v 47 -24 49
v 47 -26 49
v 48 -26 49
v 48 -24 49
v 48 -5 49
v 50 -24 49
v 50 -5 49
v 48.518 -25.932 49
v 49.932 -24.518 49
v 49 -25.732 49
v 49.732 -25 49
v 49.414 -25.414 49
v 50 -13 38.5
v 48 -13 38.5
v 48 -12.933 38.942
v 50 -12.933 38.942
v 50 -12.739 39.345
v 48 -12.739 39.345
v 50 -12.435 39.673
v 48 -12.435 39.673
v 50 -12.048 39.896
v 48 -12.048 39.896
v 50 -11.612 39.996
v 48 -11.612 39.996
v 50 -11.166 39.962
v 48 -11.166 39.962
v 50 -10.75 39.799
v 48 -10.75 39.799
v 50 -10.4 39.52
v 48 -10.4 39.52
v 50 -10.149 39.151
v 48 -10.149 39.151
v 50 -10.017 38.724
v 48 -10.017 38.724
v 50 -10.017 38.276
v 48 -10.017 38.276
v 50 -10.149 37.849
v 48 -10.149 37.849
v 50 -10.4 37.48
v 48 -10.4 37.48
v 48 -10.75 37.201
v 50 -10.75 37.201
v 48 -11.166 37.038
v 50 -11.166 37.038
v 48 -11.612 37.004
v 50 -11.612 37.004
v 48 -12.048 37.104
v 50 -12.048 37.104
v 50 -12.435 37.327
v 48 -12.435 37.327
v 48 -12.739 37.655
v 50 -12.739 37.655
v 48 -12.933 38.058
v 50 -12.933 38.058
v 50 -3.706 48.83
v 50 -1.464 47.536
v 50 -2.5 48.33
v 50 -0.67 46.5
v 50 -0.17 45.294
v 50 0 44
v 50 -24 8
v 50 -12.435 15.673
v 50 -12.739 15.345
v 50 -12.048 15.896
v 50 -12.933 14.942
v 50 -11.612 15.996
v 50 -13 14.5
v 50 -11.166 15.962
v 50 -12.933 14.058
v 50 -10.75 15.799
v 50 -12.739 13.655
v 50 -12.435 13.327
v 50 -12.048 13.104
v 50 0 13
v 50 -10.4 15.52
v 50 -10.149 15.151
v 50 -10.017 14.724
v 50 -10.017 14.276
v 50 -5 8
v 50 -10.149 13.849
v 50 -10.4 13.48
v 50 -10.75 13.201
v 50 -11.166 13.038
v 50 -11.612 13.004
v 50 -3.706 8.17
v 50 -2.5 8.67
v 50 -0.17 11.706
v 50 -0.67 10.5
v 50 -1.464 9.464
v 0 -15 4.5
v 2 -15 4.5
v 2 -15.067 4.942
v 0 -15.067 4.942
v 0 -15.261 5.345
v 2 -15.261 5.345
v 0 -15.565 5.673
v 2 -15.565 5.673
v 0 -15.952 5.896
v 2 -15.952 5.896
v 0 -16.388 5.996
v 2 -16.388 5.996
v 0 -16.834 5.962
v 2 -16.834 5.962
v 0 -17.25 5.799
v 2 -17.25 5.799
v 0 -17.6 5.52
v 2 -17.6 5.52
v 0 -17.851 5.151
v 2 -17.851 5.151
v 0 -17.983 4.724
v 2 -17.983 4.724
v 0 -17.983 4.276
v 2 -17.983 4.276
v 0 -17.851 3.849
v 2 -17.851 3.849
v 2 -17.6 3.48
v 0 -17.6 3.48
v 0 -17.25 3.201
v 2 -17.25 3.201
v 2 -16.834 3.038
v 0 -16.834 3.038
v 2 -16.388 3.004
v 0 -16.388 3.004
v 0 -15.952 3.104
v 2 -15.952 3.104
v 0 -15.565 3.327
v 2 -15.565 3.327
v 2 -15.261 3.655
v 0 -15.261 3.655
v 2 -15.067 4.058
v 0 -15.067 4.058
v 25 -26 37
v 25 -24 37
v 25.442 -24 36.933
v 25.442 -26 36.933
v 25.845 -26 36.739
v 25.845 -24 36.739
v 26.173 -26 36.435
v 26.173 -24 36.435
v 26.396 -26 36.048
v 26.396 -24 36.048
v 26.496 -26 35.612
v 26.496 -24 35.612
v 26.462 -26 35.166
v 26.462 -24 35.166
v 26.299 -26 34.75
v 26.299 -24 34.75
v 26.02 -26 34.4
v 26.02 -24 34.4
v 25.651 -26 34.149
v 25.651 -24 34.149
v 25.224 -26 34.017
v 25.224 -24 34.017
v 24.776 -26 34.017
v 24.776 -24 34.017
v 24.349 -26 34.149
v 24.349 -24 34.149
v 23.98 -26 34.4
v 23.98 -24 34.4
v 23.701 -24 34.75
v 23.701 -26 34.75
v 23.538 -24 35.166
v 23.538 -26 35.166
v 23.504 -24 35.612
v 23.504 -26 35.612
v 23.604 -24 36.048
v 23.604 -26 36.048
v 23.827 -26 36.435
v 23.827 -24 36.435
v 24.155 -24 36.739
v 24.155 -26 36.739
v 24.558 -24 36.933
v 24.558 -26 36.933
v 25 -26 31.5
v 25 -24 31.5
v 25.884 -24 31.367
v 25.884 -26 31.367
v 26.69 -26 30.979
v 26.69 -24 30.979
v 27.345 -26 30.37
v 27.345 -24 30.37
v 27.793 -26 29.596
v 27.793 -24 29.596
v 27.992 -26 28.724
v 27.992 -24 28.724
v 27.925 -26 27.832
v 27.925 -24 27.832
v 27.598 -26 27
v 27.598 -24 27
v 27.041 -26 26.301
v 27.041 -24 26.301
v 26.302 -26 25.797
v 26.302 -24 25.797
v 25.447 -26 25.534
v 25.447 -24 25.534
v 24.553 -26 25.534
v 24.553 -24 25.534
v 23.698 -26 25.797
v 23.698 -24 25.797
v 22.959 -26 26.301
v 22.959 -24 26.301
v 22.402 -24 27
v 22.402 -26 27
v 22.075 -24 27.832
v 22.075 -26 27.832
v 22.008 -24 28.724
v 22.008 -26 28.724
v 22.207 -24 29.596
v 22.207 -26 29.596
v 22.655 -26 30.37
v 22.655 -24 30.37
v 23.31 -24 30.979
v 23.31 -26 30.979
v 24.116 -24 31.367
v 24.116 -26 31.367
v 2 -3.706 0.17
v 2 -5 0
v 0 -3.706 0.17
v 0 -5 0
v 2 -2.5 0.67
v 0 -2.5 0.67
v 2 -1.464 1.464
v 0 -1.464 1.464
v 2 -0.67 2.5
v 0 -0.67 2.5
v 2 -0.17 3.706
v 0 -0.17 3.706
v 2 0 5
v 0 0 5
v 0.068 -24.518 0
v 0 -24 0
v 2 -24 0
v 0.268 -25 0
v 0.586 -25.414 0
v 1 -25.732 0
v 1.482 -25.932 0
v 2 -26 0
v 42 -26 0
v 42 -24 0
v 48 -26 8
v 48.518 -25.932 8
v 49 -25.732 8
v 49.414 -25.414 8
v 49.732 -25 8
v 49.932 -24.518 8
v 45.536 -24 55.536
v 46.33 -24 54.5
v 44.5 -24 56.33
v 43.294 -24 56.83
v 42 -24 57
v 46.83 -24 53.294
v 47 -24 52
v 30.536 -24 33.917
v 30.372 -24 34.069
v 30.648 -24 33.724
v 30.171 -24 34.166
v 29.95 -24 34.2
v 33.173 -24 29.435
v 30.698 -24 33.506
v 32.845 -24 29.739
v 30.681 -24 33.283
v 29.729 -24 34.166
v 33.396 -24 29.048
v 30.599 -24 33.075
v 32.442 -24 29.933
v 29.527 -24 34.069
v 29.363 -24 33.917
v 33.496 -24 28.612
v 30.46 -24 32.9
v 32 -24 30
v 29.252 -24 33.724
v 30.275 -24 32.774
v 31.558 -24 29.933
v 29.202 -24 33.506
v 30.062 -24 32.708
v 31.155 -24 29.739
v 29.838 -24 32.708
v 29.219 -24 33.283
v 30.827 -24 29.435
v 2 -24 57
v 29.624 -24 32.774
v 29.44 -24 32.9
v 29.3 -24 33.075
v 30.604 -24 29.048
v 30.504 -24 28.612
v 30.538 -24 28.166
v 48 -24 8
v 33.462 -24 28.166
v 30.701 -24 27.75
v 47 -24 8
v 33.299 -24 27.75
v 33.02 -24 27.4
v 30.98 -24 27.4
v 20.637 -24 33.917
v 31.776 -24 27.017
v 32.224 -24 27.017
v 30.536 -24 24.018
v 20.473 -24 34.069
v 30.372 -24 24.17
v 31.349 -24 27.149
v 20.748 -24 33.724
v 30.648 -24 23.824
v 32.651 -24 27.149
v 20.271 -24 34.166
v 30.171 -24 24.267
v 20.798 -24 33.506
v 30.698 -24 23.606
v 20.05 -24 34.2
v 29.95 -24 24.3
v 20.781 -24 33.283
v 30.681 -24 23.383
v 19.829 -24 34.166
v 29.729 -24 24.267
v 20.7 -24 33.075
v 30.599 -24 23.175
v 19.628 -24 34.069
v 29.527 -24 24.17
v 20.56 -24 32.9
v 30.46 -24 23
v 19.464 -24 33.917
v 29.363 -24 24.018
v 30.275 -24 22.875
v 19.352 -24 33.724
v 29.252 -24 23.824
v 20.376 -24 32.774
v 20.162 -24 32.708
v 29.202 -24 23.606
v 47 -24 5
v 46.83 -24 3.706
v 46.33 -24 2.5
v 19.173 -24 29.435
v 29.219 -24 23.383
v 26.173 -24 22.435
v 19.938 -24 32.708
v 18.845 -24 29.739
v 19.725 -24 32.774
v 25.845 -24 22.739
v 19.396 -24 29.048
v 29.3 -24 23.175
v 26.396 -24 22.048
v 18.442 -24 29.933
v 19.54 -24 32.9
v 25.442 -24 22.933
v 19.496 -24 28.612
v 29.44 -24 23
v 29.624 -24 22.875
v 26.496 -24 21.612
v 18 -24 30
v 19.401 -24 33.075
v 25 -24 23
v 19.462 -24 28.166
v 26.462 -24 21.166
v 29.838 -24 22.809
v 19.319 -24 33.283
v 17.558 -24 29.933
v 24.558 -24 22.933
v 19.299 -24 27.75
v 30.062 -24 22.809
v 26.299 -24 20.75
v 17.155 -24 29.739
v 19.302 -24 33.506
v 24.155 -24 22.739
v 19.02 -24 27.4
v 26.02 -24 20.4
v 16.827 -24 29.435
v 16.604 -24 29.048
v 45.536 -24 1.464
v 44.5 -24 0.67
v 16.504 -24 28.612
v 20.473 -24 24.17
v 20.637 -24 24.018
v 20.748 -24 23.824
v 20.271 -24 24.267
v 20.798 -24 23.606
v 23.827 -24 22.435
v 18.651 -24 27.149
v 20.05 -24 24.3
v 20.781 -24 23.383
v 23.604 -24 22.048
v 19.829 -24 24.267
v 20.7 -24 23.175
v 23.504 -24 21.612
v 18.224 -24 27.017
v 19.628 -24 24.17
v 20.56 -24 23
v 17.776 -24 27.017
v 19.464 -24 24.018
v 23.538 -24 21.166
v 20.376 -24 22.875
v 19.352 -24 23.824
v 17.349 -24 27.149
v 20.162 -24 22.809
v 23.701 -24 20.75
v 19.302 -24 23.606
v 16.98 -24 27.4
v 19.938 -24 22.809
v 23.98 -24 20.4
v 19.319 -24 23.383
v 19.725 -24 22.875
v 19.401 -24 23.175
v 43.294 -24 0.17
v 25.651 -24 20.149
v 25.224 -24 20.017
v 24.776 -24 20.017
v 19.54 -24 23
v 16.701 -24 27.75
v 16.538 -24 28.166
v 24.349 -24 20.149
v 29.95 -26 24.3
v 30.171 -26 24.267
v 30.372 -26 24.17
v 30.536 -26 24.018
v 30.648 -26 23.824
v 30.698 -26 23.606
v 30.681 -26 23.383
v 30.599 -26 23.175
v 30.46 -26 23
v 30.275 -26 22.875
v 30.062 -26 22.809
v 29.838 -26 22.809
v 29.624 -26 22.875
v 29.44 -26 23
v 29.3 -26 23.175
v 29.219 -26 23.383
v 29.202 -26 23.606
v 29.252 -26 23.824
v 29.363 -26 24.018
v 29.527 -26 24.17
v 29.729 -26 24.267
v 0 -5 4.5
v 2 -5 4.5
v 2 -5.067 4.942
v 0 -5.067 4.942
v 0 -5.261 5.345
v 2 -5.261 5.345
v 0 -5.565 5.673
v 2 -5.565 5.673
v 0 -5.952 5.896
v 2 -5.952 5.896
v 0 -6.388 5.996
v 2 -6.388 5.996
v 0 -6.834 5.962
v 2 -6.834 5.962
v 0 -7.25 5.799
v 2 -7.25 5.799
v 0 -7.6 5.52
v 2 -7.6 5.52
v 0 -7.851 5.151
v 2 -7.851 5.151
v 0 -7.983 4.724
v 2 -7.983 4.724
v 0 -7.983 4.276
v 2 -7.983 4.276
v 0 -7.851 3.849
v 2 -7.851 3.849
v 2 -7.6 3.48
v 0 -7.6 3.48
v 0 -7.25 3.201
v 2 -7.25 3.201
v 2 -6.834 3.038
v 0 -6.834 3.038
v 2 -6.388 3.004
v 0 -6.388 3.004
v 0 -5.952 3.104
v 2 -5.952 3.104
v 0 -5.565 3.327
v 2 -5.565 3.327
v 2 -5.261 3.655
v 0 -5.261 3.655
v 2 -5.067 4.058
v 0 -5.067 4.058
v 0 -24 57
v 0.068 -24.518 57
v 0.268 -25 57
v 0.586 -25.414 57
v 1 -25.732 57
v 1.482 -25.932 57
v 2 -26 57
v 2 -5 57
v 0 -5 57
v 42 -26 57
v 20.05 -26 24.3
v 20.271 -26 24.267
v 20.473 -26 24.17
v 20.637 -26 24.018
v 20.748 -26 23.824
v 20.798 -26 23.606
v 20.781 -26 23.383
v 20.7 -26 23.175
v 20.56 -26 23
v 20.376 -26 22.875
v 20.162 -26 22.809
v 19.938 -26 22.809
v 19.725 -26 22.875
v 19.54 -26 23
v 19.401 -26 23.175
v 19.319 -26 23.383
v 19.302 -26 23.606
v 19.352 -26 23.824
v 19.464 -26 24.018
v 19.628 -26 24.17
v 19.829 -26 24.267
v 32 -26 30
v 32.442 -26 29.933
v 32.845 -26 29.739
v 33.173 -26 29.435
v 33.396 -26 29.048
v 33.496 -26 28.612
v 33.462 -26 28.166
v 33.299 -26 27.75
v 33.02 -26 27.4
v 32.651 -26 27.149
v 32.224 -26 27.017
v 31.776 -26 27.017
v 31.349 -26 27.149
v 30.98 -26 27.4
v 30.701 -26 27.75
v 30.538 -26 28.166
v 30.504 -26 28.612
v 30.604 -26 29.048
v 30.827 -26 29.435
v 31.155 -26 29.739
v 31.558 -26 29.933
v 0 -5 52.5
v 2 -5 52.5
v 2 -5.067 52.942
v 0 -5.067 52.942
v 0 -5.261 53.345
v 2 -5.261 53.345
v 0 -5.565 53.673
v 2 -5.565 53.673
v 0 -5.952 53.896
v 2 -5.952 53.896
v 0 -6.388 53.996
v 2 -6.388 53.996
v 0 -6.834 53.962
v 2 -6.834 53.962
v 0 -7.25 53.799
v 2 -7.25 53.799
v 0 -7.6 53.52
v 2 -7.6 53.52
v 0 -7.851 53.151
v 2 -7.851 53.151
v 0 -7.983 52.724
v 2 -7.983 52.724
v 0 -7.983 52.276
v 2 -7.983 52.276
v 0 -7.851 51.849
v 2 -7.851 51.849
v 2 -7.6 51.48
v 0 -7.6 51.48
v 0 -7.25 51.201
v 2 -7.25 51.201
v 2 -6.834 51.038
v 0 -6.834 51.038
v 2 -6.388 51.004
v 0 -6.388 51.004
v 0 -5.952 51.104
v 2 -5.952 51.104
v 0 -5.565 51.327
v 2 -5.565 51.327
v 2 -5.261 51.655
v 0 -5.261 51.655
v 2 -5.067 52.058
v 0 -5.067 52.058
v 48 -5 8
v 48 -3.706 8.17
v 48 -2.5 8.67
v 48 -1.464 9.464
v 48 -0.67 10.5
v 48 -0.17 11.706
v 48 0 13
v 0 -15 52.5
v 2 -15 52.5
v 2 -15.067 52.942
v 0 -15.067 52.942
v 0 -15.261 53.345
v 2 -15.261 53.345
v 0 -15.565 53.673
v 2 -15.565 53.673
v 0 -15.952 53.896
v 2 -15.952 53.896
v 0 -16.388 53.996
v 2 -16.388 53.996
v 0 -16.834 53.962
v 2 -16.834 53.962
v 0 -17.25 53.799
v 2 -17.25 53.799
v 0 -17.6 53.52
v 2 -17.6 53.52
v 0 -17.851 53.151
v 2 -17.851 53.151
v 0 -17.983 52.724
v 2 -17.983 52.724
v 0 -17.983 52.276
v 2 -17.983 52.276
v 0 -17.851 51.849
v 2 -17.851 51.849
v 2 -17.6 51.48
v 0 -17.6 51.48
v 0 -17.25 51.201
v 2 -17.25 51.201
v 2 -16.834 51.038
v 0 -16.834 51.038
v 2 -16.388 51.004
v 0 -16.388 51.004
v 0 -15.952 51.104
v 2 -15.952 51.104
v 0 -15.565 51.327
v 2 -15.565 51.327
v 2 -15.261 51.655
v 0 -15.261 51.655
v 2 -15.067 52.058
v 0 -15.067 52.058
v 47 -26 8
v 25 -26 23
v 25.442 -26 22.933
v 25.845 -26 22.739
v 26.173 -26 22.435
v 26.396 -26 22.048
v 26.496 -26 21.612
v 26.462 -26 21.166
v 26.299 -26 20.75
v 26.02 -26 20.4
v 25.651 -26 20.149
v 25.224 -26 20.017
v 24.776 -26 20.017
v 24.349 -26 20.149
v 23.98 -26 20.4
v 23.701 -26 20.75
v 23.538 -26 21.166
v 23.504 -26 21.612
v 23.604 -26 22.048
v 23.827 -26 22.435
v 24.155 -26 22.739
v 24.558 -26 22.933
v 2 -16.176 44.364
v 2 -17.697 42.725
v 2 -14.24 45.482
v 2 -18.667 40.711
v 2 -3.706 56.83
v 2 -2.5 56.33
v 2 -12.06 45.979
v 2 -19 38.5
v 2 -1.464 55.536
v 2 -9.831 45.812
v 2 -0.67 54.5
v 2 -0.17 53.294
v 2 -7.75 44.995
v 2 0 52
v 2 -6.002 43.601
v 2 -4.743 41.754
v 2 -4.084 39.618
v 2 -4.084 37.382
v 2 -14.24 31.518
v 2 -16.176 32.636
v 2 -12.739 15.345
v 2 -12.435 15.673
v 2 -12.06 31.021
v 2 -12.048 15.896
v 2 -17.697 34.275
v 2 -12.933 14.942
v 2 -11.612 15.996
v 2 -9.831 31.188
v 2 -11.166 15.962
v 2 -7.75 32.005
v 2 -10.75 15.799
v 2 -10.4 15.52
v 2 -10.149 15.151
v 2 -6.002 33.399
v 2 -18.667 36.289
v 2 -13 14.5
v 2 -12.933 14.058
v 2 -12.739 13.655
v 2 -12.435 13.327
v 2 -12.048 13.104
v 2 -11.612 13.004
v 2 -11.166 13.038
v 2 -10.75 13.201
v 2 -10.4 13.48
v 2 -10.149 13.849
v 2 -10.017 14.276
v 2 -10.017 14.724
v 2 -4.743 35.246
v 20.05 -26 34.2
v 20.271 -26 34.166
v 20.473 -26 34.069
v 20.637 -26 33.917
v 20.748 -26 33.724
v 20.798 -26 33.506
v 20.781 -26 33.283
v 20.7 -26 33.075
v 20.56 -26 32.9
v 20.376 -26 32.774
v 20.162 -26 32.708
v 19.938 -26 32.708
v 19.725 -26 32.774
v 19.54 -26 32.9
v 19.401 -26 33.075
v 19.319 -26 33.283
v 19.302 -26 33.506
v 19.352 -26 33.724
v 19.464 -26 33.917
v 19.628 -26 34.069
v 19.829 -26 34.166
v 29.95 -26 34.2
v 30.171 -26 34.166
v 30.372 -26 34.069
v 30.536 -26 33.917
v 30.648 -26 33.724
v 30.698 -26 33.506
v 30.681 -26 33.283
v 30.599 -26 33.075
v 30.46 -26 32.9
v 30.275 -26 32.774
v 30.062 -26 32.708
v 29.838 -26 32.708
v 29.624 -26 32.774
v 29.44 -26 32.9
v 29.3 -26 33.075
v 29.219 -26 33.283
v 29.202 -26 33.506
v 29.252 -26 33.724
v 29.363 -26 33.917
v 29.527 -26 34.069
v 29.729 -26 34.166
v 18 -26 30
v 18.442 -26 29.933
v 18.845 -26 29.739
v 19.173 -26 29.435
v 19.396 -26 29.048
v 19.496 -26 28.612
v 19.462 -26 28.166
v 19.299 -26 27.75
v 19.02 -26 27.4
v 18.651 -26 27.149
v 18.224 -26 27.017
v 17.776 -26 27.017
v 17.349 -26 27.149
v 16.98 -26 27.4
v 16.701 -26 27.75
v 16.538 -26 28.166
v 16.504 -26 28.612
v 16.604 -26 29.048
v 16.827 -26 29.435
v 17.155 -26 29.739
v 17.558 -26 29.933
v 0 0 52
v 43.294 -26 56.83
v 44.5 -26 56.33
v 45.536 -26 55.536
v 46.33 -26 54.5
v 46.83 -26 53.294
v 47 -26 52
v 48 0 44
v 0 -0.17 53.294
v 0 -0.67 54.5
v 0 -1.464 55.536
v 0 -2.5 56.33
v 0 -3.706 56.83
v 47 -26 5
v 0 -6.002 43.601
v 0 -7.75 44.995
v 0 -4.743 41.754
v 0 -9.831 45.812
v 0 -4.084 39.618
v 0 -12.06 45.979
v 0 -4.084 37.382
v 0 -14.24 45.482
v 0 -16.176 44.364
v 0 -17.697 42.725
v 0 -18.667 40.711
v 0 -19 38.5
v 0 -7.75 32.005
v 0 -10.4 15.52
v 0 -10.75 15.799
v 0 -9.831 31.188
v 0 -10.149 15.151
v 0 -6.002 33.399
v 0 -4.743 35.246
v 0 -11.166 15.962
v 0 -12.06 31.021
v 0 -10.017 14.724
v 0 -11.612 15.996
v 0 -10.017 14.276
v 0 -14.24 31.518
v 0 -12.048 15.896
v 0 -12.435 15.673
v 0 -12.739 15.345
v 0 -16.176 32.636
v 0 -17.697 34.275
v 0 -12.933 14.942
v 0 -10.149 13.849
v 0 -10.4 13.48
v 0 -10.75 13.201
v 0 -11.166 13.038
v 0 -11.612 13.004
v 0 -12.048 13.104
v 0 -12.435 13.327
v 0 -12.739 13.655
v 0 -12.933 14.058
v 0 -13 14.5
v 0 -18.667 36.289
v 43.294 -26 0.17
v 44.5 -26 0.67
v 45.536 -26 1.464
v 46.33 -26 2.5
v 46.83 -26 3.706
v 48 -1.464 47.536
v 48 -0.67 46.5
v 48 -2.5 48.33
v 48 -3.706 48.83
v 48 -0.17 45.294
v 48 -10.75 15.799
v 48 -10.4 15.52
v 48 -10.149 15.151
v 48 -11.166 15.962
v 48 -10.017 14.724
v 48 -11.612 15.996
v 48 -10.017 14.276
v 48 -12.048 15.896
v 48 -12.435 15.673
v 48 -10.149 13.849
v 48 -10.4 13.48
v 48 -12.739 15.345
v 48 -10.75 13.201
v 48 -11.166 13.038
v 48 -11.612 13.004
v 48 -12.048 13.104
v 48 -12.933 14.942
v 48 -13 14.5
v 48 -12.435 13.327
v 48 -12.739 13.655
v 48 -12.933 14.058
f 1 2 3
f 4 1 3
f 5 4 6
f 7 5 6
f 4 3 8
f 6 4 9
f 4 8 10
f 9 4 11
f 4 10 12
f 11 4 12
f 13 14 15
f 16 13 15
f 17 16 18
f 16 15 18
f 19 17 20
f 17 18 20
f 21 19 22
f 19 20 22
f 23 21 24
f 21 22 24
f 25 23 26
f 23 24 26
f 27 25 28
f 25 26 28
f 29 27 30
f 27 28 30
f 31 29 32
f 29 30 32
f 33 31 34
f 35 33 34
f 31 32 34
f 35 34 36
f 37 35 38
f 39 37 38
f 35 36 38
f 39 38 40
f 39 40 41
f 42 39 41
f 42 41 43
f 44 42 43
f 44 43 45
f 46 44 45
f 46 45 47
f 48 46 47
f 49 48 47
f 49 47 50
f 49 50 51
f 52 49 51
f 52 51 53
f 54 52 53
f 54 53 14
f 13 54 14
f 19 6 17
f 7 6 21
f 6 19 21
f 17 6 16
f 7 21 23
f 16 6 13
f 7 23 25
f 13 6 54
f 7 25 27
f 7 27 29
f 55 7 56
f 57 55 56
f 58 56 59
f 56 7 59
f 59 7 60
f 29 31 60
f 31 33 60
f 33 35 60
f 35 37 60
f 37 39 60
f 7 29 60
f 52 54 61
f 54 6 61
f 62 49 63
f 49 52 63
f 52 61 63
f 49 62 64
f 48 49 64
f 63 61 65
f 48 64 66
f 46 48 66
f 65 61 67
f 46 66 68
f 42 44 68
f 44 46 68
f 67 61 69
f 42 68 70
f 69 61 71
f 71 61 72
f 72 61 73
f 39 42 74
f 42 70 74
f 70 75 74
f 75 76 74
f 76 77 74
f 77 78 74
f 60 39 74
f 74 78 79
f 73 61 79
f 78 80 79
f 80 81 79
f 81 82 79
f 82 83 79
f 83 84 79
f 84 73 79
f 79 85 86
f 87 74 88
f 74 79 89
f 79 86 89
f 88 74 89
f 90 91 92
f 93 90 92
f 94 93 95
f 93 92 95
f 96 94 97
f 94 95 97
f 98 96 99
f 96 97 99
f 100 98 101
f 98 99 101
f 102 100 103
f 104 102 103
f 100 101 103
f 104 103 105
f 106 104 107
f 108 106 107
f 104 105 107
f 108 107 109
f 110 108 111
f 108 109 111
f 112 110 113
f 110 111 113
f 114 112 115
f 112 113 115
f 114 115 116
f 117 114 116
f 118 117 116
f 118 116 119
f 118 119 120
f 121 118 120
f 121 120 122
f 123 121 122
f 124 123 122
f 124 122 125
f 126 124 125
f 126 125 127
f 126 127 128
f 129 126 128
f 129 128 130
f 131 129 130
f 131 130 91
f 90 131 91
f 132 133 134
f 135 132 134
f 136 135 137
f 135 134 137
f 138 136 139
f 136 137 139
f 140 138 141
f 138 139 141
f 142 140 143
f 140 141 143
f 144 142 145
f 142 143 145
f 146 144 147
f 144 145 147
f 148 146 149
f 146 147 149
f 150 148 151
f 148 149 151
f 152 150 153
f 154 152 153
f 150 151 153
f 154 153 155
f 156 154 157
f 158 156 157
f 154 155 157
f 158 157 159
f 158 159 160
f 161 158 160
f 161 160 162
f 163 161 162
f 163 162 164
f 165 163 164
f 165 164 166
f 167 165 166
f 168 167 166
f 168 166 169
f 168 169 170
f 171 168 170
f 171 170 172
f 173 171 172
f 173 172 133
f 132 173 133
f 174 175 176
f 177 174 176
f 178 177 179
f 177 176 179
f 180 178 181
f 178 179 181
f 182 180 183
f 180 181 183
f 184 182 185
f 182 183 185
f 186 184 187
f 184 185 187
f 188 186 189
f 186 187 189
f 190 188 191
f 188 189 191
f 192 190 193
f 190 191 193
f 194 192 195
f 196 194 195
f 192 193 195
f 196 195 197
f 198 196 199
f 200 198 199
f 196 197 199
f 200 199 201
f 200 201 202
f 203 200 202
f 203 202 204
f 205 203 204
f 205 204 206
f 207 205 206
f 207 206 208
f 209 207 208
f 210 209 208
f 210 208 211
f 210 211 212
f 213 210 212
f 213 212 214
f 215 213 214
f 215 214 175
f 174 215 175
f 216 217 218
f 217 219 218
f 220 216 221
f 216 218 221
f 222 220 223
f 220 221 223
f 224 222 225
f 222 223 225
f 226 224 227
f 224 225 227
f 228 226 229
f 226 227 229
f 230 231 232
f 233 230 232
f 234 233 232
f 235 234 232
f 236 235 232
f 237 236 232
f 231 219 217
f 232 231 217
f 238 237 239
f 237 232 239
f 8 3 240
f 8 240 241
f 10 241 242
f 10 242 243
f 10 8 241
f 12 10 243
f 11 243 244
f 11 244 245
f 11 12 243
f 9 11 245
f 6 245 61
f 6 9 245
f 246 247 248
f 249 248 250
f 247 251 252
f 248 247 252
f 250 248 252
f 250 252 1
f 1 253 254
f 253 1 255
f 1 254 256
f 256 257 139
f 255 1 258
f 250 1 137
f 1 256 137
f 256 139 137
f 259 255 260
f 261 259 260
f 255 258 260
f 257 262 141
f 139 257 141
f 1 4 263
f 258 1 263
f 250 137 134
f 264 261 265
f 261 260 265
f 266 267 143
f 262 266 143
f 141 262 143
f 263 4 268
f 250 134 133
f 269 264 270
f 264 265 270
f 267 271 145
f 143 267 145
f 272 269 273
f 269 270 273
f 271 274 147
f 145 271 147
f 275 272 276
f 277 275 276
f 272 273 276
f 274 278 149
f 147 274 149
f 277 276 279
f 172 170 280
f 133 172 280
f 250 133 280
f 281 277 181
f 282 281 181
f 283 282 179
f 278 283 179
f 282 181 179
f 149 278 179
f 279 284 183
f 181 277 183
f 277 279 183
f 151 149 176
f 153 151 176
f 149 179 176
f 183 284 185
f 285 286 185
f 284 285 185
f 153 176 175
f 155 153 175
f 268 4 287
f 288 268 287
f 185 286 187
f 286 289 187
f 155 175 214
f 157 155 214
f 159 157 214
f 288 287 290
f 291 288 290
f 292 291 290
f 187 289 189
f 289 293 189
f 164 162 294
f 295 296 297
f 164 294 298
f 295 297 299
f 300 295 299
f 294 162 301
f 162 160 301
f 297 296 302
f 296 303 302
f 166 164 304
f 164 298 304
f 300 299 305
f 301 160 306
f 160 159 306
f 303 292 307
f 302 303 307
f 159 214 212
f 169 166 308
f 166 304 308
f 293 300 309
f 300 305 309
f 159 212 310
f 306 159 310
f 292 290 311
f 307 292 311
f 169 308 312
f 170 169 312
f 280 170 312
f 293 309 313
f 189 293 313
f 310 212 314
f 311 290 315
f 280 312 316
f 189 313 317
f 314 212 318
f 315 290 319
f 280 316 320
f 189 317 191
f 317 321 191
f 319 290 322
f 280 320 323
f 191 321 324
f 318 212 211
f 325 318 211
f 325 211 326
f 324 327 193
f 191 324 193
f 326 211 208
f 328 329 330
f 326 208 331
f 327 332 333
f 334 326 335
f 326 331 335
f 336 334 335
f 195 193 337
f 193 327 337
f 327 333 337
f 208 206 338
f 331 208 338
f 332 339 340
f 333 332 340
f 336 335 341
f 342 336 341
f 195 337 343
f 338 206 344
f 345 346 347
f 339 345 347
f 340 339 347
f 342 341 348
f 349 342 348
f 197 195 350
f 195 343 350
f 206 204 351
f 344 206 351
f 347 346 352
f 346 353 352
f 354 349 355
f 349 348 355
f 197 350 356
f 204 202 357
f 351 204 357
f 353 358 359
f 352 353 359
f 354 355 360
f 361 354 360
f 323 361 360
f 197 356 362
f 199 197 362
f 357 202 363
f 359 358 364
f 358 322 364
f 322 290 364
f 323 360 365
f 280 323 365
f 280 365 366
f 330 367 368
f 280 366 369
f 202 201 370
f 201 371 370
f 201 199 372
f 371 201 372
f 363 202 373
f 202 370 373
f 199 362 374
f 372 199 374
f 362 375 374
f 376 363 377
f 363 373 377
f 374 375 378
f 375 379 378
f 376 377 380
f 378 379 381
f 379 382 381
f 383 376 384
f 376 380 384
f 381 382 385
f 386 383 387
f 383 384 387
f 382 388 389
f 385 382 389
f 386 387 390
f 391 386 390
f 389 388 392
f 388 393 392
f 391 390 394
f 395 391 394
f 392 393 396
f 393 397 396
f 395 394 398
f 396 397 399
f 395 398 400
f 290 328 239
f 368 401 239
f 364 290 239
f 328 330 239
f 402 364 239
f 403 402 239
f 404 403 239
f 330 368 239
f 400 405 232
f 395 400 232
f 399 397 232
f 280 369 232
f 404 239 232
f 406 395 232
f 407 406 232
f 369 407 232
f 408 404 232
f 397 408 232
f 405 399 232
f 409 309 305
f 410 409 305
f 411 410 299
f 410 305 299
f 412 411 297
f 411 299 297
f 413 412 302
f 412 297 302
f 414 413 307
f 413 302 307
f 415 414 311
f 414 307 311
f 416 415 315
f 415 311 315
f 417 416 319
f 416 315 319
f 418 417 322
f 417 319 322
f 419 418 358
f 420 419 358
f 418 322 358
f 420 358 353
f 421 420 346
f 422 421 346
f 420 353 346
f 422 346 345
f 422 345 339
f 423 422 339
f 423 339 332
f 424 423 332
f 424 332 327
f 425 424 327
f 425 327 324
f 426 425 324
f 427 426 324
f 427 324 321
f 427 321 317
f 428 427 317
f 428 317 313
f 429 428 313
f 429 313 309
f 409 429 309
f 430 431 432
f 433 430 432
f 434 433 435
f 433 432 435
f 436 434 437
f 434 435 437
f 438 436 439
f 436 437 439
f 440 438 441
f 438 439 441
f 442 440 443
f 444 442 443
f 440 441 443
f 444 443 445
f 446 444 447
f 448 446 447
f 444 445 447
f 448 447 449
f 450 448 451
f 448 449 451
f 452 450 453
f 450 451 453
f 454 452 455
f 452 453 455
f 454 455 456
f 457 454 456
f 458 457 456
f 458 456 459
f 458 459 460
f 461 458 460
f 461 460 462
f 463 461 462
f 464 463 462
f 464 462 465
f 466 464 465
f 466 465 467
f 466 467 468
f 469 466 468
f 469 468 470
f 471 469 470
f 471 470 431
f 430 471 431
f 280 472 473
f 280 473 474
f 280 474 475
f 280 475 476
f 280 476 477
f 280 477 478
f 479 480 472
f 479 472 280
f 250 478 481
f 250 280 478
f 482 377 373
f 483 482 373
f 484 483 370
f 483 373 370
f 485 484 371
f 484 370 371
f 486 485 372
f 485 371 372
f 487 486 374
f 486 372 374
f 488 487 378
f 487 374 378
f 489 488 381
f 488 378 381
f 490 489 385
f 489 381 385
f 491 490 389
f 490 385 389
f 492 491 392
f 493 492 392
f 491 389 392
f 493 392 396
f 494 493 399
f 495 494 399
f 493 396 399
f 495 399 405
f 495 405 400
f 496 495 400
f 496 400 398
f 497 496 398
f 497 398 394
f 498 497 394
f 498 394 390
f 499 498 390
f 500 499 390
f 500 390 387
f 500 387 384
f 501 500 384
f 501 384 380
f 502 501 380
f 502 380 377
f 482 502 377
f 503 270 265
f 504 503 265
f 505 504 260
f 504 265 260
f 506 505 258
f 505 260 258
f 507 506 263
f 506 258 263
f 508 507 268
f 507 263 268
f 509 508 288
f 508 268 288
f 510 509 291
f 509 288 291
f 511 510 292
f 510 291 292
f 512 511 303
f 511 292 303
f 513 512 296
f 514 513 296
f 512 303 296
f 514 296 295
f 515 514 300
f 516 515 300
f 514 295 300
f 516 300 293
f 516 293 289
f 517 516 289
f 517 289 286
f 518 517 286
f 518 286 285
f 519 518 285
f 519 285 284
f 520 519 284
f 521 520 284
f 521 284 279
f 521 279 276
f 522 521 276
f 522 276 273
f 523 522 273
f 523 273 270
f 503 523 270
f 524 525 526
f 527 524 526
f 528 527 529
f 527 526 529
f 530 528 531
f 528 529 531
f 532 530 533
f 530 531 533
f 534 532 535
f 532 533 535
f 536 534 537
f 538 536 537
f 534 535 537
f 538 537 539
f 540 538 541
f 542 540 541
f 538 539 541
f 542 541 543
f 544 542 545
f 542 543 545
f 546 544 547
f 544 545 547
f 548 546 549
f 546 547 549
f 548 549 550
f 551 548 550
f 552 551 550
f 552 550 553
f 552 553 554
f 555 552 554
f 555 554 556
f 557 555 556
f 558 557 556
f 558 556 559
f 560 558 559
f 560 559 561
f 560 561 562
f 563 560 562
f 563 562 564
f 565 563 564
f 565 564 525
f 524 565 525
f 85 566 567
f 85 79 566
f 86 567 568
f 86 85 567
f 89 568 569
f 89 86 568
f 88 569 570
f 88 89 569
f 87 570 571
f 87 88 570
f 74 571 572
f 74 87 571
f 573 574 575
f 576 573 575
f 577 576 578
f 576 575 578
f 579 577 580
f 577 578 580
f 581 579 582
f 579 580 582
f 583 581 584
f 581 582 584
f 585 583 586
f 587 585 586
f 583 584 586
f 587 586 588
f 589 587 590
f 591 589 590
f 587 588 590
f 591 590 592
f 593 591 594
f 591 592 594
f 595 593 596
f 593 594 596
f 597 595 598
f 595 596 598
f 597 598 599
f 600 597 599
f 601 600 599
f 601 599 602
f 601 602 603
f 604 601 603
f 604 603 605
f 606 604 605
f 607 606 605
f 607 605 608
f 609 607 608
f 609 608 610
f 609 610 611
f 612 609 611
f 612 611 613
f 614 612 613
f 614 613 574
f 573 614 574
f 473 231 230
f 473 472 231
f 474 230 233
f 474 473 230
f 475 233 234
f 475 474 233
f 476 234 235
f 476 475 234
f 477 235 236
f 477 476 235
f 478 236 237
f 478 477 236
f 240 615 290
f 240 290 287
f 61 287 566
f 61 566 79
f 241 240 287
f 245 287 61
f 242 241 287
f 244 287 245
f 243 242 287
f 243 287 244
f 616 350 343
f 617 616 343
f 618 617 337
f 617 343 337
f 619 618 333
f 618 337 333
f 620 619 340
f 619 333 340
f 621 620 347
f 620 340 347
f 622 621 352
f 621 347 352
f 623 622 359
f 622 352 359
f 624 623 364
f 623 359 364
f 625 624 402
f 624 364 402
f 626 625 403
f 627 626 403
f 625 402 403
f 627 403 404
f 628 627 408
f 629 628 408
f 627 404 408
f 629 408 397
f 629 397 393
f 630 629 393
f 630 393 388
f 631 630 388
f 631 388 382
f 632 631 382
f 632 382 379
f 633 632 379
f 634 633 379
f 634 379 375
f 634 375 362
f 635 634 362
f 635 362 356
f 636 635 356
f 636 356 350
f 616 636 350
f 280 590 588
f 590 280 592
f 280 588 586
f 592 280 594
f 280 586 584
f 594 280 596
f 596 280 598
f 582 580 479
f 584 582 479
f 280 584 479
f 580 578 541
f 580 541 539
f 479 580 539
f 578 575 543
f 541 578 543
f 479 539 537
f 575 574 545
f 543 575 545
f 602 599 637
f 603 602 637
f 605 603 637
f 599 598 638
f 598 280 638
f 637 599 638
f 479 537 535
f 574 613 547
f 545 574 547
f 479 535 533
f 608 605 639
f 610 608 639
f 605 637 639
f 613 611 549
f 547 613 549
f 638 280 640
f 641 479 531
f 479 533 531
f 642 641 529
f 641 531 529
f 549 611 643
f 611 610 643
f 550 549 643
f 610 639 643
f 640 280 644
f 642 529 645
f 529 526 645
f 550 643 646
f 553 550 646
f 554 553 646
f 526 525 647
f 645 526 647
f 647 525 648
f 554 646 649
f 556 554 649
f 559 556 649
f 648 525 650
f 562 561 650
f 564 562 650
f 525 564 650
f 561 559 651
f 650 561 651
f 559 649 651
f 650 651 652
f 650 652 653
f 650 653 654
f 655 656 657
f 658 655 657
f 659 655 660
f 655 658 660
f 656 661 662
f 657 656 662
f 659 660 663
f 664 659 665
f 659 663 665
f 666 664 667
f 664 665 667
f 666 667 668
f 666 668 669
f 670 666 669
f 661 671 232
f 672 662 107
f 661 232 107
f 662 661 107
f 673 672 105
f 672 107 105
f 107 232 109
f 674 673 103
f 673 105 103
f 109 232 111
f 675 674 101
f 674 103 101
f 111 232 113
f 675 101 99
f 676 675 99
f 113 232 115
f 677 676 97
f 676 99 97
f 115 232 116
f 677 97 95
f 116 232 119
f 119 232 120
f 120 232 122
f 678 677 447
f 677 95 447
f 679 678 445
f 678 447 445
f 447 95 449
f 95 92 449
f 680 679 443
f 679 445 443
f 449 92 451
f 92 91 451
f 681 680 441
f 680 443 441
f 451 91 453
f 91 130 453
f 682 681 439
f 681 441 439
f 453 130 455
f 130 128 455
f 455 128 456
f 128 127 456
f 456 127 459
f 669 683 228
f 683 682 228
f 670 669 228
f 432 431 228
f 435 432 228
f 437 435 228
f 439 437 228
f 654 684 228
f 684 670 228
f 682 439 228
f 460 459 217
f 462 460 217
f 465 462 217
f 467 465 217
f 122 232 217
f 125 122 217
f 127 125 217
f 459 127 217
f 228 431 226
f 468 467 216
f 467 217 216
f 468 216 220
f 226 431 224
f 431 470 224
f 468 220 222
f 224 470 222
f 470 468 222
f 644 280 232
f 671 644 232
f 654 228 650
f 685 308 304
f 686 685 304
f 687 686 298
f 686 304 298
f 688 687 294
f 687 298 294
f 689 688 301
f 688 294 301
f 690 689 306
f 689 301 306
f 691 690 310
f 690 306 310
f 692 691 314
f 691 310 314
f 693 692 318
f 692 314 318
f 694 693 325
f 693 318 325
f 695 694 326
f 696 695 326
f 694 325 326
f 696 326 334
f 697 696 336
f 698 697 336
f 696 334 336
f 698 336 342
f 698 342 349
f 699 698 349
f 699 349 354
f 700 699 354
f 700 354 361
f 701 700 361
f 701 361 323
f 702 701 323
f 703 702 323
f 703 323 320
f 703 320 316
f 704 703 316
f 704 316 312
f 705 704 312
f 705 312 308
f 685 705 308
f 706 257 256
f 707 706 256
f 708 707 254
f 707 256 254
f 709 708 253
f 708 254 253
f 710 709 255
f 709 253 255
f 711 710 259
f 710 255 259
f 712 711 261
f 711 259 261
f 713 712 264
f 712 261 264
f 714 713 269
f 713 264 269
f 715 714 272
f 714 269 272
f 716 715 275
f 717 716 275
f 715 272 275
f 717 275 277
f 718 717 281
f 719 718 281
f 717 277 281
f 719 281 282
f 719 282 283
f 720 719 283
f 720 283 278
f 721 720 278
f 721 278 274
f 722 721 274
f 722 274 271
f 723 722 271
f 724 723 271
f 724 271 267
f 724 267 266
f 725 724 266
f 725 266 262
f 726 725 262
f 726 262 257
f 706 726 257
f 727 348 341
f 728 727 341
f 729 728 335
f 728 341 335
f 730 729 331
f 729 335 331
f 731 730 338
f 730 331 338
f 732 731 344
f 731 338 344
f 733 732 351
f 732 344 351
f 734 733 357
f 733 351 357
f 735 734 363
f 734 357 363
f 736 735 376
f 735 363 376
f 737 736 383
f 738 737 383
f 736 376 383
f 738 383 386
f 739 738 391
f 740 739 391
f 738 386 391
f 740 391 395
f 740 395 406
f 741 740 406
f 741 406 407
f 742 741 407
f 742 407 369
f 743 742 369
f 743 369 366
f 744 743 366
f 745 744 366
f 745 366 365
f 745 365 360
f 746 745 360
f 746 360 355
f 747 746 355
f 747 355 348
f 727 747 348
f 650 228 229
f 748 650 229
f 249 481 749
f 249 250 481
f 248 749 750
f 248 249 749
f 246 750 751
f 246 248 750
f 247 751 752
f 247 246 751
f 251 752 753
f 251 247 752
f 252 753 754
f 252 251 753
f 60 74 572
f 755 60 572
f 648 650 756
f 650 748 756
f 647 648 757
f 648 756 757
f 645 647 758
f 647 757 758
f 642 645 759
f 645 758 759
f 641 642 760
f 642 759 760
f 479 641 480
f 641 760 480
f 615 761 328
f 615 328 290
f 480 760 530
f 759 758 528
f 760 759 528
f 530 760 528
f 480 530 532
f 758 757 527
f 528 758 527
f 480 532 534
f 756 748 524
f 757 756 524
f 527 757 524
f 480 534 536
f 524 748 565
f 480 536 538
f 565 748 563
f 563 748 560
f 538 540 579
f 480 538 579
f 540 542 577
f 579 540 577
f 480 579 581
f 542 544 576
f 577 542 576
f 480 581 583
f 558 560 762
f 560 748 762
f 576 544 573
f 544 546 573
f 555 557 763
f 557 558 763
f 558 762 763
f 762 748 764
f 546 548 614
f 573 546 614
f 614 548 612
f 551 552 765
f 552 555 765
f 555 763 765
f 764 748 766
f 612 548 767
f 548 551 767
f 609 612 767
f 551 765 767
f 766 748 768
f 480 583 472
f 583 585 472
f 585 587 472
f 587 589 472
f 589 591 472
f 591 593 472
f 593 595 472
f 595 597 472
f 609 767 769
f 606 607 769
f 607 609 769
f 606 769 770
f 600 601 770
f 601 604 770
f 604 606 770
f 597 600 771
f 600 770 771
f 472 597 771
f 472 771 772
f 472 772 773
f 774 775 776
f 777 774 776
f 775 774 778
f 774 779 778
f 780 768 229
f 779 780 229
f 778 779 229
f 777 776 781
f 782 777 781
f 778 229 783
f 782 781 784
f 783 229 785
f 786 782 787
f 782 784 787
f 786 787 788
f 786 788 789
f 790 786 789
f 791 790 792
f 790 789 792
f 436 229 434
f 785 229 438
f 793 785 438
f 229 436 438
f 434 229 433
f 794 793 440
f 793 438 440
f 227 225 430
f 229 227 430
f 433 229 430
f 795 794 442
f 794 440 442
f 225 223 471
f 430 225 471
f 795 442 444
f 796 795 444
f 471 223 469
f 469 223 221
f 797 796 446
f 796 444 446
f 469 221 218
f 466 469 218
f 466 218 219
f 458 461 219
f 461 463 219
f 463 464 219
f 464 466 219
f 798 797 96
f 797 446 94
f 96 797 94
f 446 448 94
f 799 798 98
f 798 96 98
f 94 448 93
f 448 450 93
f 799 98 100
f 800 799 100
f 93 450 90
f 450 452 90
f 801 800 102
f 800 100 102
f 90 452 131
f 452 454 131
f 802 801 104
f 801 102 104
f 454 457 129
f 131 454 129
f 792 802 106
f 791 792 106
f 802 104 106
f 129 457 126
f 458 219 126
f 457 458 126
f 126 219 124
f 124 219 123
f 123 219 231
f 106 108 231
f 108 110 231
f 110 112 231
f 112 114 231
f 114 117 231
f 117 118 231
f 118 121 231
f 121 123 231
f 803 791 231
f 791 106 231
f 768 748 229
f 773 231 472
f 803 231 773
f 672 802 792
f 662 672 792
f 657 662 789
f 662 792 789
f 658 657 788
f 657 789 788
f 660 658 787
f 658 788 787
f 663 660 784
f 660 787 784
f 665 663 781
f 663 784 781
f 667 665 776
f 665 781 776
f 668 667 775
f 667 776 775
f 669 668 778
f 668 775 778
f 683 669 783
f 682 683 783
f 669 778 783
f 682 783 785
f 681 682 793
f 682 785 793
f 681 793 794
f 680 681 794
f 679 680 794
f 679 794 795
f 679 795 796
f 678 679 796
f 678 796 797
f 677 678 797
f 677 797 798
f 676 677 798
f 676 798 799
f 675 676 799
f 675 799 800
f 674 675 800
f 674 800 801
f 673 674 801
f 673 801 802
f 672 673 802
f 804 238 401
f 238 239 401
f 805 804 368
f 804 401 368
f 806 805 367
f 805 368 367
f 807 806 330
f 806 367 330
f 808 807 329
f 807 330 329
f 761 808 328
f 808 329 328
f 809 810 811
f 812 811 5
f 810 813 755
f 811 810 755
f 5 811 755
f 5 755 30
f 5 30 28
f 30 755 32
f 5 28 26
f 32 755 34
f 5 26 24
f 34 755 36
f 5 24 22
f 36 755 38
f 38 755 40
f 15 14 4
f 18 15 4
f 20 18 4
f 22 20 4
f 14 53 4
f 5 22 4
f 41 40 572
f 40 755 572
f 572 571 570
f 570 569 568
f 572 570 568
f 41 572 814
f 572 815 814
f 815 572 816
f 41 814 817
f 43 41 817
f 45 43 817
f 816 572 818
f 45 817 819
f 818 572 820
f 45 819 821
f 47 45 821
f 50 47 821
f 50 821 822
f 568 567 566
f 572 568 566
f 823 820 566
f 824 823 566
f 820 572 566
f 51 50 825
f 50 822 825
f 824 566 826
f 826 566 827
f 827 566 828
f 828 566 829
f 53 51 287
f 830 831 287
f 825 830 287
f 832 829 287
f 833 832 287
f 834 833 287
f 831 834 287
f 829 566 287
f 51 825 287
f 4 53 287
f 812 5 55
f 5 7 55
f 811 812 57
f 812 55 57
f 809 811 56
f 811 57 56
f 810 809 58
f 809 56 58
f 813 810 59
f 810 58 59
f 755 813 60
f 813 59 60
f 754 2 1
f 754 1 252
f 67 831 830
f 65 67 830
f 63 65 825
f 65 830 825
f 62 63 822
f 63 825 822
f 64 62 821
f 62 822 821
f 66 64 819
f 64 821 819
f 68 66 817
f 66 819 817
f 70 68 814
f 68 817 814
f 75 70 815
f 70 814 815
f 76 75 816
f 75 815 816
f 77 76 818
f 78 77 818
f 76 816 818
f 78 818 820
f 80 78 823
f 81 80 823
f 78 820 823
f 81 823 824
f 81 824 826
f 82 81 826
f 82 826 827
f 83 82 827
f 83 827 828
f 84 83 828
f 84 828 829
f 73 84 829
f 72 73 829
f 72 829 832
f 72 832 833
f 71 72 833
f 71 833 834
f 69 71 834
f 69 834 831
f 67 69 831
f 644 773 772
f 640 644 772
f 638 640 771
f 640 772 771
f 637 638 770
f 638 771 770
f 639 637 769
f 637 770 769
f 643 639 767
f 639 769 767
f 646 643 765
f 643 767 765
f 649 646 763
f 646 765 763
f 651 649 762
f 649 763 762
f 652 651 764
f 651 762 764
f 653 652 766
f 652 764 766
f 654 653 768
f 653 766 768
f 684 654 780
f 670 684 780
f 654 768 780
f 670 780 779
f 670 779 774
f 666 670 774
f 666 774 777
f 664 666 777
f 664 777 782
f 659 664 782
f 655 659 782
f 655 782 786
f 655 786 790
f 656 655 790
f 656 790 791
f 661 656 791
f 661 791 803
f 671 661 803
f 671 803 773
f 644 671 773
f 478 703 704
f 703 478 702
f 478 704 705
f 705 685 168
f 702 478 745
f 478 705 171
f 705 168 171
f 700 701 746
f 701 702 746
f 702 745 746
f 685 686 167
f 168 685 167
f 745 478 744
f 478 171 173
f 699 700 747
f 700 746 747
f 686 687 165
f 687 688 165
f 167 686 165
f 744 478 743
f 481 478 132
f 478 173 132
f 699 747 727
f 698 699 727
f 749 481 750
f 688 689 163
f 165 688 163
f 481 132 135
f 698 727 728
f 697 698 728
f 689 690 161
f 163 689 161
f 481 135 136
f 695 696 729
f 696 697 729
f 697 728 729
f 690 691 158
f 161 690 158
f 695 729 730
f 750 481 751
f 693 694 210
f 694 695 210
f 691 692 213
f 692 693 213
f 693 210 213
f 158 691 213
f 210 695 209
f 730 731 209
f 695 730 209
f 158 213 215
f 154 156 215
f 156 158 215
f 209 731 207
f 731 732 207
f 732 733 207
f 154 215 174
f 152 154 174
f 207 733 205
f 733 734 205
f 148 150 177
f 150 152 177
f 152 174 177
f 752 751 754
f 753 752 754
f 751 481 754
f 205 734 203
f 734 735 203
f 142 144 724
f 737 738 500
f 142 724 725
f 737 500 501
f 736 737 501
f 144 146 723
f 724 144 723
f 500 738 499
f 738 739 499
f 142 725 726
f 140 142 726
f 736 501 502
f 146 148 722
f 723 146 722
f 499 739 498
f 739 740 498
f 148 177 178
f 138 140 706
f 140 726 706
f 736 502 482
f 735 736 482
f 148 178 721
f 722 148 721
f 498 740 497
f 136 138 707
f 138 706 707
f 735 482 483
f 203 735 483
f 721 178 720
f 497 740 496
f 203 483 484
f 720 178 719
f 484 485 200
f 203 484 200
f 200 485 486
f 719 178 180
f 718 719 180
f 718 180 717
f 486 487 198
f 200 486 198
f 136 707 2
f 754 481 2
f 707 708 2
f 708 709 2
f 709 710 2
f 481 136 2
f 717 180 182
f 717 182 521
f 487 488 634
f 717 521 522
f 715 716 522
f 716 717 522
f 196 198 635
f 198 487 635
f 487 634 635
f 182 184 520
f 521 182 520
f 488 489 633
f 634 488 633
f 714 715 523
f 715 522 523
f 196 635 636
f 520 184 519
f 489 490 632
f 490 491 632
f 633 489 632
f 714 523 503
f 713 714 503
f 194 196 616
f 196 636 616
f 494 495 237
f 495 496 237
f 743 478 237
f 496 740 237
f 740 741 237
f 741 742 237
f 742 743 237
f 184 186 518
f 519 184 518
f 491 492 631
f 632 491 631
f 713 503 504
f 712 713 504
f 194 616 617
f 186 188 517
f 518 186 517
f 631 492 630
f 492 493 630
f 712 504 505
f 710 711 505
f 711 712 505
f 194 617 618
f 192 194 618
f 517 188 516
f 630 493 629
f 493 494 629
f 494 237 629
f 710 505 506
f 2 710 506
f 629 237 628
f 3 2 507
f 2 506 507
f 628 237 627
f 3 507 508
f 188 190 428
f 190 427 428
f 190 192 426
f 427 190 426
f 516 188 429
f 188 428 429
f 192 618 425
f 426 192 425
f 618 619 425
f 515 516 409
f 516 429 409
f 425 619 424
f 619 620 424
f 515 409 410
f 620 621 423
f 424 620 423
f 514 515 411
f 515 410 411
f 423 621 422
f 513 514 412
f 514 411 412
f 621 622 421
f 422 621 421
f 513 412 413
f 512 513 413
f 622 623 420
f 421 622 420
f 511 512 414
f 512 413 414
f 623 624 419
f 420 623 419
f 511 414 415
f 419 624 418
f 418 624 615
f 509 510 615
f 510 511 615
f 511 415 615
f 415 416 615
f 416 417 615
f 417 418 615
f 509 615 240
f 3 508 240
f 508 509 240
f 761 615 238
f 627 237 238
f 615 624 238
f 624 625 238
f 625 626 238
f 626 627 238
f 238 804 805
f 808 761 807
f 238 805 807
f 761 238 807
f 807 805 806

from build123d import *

# Parameters (mm, degrees)
EXTRUDE_1_DEPTH     = 57
SKETCH_2_R          = 7.5
SKETCH_2_R_2        = 1.5
CUT_EXTRUDE_1_DEPTH = 27
SKETCH_3_R          = 1.5
CUT_EXTRUDE_2_DEPTH = 10
SKETCH_4_R          = 1.5
SKETCH_4_R_2        = 3
SKETCH_4_R_3        = 0.75
CUT_EXTRUDE_3_DEPTH = 10
SKETCH_5_R          = 1.5
CUT_EXTRUDE_4_DEPTH = 3
FILLET_2_R          = 2
SKETCH_6_W          = 3
SKETCH_6_H          = 8
CUT_EXTRUDE_5_DEPTH = 44
FILLET_3_R          = 5


with BuildPart() as part:
    # 草图1 → 凸台-拉伸1 (new body)
    with BuildSketch(Plane.XY):
        Polygon((0, 0), (0, -26), (50, -26), (50, 0), (48, 0), (48, -24), (2, -24), (2, 0), align=None)
    extrude(amount=EXTRUDE_1_DEPTH)

    # 草图2 → 切除-拉伸1 (cut)
    with BuildSketch(Plane.ZY):
        with Locations(Location((38.5, -11.5, 0), (0, 0, 270))):
            Circle(SKETCH_2_R)
        with Locations(Location((14.5, -11.5, 0), (0, 0, 270))):
            Circle(SKETCH_2_R_2)
    extrude(amount=-CUT_EXTRUDE_1_DEPTH, mode=Mode.SUBTRACT)

    # 草图3 → 切除-拉伸2 (cut)
    with BuildSketch(Plane(origin=(2, 0, 0), x_dir=(0, 0, -1), z_dir=(1, 0, 0))):
        with Locations(Location((-4.5, -6.5, 0), (0, 0, 90))):
            Circle(SKETCH_3_R)
        with Locations(Location((-4.5, -16.5, 0), (0, 0, 90))):
            Circle(SKETCH_3_R)
        with Locations(Location((-52.5, -16.5, 0), (0, 0, 90))):
            Circle(SKETCH_3_R)
        with Locations(Location((-52.5, -6.5, 0), (0, 0, 90))):
            Circle(SKETCH_3_R)
    extrude(amount=-CUT_EXTRUDE_2_DEPTH, mode=Mode.SUBTRACT)

    # 草图4 → 切除-拉伸3 (cut)
    with BuildSketch(Plane(origin=(0, -24, 0), x_dir=(1, 0, 0), z_dir=(0, 1, 0))):
        with Locations(Location((18, -28.5, 0), (0, 0, 270))):
            Circle(SKETCH_4_R)
        with Locations(Location((25, -21.5, 0), (0, 0, 270))):
            Circle(SKETCH_4_R)
        with Locations(Location((32, -28.5, 0), (0, 0, 270))):
            Circle(SKETCH_4_R)
        with Locations(Location((25, -35.5, 0), (0, 0, 270))):
            Circle(SKETCH_4_R)
        with Locations(Location((25, -28.5, 0), (0, 0, 270))):
            Circle(SKETCH_4_R_2)
        with Locations(Location((20.050252532, -23.550252532, 0), (0, 0, 270))):
            Circle(SKETCH_4_R_3)
        with Locations(Location((29.949747468, -23.550252532, 0), (0, 0, 270))):
            Circle(SKETCH_4_R_3)
        with Locations(Location((29.949747468, -33.449747468, 0), (0, 0, 270))):
            Circle(SKETCH_4_R_3)
        with Locations(Location((20.050252532, -33.449747468, 0), (0, 0, 270))):
            Circle(SKETCH_4_R_3)
    extrude(amount=-CUT_EXTRUDE_3_DEPTH, mode=Mode.SUBTRACT)

    # 草图5 → 切除-拉伸4 (cut)
    with BuildSketch(Plane.ZY.offset(-48)):
        with Locations(Location((14.5, -11.5, 0), (0, 0, 270))):
            Circle(SKETCH_5_R)
        with Locations(Location((38.5, -11.5, 0), (0, 0, 270))):
            Circle(SKETCH_5_R)
    extrude(amount=-CUT_EXTRUDE_4_DEPTH, mode=Mode.SUBTRACT)

    # 圆角2
    fillet_2_edges = [part.edges().sort_by_distance(p)[0] for p in [
        (50, -26, 28.5),
        (0, -26, 28.5),
    ]]
    fillet(fillet_2_edges, radius=FILLET_2_R)

    # 草图6 → 切除-拉伸5 (cut)
    with BuildSketch(Plane.XZ.offset(26)):
        with Locations((48.5, 53)):
            Rectangle(SKETCH_6_W, SKETCH_6_H)
        with Locations((48.5, 4)):
            Rectangle(SKETCH_6_W, SKETCH_6_H)
    extrude(amount=-CUT_EXTRUDE_5_DEPTH, mode=Mode.SUBTRACT)

    # 圆角3
    fillet_3_edges = [part.edges().sort_by_distance(p)[0] for p in [
        (1, 0, 0),
        (47, -25, 57),
        (49, 0, 49),
        (47, -25, 0),
        (49, 0, 8),
        (1, 0, 57),
    ]]
    fillet(fillet_3_edges, radius=FILLET_3_R)


solid = part.part
